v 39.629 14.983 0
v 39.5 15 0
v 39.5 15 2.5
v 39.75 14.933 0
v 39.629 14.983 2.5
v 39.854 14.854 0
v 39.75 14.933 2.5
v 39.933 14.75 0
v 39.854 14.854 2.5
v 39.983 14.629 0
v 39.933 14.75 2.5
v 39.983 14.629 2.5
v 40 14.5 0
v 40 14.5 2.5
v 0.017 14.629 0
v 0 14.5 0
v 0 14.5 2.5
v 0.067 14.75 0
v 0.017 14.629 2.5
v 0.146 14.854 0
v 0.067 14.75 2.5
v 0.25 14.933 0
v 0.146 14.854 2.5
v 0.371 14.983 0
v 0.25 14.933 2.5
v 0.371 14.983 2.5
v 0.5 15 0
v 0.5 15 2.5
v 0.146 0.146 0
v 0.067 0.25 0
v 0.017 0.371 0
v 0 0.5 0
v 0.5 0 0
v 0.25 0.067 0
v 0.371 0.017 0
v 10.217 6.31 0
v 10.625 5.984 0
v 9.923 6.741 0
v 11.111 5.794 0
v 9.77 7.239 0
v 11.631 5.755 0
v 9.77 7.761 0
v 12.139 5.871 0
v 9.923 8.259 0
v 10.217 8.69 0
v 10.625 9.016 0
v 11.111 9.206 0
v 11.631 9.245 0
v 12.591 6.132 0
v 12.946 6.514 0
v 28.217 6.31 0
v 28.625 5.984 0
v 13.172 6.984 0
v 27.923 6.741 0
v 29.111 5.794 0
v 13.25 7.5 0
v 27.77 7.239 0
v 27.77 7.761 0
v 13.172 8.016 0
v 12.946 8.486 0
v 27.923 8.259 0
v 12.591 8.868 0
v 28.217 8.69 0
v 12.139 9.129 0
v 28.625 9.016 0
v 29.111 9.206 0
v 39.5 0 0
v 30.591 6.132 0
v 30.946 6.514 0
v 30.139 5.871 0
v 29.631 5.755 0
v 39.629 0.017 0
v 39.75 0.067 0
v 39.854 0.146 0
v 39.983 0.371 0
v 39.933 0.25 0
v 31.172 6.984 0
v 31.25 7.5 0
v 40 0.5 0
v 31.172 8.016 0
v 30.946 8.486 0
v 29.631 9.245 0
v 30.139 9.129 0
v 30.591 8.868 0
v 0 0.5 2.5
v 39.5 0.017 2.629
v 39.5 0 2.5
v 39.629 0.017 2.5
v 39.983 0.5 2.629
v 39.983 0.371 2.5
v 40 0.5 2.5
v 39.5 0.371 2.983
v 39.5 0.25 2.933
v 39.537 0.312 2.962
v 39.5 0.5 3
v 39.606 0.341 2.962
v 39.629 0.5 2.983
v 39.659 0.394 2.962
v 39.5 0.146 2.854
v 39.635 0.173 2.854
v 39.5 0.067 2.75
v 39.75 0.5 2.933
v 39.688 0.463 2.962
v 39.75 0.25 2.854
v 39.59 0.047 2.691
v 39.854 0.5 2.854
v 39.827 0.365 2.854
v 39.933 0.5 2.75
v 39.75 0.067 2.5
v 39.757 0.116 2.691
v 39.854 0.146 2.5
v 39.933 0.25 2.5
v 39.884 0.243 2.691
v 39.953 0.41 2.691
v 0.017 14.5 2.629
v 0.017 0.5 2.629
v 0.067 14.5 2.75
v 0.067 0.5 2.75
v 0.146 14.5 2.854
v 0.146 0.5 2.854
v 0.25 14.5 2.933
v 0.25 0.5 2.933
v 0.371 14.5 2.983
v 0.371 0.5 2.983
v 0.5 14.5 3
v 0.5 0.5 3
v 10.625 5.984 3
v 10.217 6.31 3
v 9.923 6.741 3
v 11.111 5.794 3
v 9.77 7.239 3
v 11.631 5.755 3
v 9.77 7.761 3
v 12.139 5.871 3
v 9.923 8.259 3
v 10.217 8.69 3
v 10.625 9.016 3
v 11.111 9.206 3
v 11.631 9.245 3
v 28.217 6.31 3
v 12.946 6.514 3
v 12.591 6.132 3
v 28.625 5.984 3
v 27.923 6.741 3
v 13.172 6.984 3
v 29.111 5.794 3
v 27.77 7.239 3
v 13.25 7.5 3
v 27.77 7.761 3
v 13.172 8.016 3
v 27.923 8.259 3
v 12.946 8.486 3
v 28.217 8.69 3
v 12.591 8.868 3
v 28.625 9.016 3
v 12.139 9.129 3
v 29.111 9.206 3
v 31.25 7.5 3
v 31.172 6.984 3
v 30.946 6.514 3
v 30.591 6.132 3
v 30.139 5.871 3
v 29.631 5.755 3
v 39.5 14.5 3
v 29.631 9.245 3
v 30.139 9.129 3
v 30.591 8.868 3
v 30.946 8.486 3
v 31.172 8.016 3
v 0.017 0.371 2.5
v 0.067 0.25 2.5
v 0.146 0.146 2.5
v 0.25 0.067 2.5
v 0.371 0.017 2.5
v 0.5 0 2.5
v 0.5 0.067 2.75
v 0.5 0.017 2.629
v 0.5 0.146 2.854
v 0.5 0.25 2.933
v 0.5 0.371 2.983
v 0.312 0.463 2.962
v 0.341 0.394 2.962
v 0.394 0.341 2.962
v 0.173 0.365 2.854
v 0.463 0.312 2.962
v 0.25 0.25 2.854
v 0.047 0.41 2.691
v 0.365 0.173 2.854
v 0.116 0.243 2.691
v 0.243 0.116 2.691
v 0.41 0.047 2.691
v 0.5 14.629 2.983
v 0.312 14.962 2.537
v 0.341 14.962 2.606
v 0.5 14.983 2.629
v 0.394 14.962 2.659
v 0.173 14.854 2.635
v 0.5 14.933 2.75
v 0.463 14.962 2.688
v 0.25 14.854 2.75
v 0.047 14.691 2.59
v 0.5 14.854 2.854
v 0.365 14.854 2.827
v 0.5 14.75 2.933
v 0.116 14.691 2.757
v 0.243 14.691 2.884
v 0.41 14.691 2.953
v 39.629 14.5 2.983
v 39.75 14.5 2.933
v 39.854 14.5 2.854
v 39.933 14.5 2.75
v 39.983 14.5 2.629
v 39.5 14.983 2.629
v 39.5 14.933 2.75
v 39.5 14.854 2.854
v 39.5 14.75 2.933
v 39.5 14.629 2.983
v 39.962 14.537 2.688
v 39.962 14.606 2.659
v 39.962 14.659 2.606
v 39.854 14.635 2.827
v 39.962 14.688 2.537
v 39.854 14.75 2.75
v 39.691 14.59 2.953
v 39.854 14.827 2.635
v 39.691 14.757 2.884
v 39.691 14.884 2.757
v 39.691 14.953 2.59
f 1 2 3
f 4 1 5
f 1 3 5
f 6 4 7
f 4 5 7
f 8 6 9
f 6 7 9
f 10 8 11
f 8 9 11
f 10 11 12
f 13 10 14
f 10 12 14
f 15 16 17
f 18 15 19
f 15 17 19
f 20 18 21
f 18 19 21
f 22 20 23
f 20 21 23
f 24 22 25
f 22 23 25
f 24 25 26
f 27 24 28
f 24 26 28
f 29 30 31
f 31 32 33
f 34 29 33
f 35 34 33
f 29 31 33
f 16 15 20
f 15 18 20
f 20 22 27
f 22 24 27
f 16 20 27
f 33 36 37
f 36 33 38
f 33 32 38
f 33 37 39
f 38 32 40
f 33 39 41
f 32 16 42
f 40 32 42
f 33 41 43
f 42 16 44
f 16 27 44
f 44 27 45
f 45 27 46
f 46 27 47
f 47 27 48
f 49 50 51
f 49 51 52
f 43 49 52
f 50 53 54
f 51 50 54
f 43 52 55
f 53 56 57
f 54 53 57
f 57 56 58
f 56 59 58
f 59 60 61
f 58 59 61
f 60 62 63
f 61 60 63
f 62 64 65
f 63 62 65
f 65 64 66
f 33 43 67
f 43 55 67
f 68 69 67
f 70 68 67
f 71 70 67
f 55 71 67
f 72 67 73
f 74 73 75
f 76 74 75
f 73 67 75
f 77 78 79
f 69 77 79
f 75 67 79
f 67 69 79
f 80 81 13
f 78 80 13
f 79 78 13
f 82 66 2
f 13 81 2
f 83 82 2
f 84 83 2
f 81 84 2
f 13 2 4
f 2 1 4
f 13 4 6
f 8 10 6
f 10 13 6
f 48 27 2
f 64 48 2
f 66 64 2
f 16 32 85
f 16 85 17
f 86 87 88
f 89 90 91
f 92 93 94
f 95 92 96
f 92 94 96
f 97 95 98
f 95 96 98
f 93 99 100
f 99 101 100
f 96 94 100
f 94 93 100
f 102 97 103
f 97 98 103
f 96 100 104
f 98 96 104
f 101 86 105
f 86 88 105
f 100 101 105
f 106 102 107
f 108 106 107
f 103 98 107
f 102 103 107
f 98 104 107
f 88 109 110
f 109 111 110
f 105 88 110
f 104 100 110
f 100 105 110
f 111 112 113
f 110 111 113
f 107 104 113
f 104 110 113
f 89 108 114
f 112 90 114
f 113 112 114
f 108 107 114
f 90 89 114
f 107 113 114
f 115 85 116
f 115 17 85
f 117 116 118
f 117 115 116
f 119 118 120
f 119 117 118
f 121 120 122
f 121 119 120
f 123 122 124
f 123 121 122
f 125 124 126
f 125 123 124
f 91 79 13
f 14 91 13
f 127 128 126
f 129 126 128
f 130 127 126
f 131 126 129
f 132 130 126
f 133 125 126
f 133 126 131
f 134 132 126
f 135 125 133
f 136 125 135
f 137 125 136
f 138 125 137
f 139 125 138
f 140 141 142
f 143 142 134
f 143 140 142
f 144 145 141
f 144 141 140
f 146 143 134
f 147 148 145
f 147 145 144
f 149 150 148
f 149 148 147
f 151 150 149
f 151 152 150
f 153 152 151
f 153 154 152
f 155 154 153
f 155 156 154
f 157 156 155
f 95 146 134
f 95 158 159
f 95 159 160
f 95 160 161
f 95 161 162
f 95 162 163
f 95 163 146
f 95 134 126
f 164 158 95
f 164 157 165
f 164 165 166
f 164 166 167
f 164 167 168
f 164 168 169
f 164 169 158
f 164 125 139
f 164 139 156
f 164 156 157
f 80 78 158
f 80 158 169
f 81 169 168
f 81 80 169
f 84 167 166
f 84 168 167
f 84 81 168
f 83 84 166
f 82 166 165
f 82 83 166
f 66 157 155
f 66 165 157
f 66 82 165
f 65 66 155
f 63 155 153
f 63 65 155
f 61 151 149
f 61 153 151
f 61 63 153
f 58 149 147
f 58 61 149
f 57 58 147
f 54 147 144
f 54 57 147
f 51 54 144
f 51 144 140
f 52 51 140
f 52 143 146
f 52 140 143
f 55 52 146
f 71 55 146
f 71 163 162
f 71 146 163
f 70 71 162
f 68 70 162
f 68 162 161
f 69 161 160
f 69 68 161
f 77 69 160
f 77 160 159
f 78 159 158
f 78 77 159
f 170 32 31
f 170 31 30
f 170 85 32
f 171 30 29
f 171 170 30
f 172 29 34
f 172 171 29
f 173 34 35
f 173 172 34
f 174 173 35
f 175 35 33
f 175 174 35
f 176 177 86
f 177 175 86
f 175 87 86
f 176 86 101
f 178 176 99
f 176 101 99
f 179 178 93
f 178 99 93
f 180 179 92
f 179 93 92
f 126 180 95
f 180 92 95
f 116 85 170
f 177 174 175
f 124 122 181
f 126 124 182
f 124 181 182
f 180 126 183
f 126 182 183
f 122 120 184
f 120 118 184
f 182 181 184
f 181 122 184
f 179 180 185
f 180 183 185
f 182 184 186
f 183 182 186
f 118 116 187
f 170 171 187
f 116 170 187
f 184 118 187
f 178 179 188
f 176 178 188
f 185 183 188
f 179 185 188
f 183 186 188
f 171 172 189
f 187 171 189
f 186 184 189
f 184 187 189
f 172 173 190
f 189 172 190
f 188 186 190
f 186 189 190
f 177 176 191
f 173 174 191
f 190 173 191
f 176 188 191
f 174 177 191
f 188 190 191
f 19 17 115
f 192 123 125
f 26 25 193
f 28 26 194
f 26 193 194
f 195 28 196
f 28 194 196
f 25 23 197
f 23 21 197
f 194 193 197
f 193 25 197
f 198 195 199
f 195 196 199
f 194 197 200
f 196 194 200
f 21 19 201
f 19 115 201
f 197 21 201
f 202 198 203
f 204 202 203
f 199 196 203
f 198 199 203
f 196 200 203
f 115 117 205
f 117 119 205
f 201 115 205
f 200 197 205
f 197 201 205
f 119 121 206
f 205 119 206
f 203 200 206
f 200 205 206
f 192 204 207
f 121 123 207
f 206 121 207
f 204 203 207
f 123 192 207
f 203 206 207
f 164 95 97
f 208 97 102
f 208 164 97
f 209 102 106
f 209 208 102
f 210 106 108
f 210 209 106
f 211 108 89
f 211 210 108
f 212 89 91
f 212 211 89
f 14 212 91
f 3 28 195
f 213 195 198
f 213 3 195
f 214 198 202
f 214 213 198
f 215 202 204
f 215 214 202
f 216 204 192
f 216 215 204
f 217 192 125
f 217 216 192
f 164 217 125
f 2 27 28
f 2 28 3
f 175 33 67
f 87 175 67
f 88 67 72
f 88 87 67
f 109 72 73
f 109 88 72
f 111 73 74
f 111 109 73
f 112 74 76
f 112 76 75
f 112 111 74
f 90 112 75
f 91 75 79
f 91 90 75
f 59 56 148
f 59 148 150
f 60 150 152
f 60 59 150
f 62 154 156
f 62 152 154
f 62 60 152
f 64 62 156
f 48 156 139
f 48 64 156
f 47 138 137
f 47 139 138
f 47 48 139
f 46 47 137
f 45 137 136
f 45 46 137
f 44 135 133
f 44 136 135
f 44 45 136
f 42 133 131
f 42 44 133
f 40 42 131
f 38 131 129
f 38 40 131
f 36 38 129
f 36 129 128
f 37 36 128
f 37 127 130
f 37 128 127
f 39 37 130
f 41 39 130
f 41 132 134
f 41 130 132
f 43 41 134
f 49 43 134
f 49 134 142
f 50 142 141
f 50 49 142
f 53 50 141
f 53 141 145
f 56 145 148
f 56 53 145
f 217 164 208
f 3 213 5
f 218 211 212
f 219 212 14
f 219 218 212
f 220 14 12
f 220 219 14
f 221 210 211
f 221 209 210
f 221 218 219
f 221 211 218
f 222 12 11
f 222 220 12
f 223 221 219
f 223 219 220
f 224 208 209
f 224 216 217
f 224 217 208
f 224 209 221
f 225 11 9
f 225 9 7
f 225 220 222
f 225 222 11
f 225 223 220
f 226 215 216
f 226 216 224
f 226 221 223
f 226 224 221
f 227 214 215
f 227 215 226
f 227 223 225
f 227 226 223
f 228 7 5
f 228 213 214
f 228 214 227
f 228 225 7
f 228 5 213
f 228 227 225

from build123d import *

# Parameters (mm, degrees)
CYLINDER001_R     = 1.75
CYLINDER001_DEPTH = 10
CYLINDER_R        = 1.75
CYLINDER_DEPTH    = 10
BOX_W             = 40
BOX_H             = 15
BOX_DEPTH         = 3
FILLET001_R       = 0.5


with BuildPart() as cilindro001:
    # Cylinder001 → Cylinder001 (new body)
    with BuildSketch(Plane(origin=(29.5, 7.5, -4), x_dir=(1, 0, 0), z_dir=(0, 0, 1))):
        Circle(CYLINDER001_R)
    extrude(amount=CYLINDER001_DEPTH)


with BuildPart() as cilindro:
    # Cylinder → Cylinder (new body)
    with BuildSketch(Plane(origin=(11.5, 7.5, -4), x_dir=(1, 0, 0), z_dir=(0, 0, 1))):
        Circle(CYLINDER_R)
    extrude(amount=CYLINDER_DEPTH)


with BuildPart() as fillet001:
    # Box → Box (new body)
    with BuildSketch(Plane.XY):
        with Locations((20, 7.5)):
            Rectangle(BOX_W, BOX_H)
    extrude(amount=BOX_DEPTH)

    # Cut: cut Cilindro
    add(cilindro.part, mode=Mode.SUBTRACT)

    # Cut001: cut Cilindro001
    add(cilindro001.part, mode=Mode.SUBTRACT)

    # Fillet001
    fillet001_edges = [fillet001.edges().sort_by_distance(p)[0] for p in [
        (0, 0, 1.5),
        (0, 7.5, 3),
        (0, 15, 1.5),
        (40, 0, 1.5),
        (20, 0, 3),
        (20, 15, 3),
        (40, 7.5, 3),
        (40, 15, 1.5),
    ]]
    fillet(fillet001_edges, radius=FILLET001_R)


solid = fillet001.part
